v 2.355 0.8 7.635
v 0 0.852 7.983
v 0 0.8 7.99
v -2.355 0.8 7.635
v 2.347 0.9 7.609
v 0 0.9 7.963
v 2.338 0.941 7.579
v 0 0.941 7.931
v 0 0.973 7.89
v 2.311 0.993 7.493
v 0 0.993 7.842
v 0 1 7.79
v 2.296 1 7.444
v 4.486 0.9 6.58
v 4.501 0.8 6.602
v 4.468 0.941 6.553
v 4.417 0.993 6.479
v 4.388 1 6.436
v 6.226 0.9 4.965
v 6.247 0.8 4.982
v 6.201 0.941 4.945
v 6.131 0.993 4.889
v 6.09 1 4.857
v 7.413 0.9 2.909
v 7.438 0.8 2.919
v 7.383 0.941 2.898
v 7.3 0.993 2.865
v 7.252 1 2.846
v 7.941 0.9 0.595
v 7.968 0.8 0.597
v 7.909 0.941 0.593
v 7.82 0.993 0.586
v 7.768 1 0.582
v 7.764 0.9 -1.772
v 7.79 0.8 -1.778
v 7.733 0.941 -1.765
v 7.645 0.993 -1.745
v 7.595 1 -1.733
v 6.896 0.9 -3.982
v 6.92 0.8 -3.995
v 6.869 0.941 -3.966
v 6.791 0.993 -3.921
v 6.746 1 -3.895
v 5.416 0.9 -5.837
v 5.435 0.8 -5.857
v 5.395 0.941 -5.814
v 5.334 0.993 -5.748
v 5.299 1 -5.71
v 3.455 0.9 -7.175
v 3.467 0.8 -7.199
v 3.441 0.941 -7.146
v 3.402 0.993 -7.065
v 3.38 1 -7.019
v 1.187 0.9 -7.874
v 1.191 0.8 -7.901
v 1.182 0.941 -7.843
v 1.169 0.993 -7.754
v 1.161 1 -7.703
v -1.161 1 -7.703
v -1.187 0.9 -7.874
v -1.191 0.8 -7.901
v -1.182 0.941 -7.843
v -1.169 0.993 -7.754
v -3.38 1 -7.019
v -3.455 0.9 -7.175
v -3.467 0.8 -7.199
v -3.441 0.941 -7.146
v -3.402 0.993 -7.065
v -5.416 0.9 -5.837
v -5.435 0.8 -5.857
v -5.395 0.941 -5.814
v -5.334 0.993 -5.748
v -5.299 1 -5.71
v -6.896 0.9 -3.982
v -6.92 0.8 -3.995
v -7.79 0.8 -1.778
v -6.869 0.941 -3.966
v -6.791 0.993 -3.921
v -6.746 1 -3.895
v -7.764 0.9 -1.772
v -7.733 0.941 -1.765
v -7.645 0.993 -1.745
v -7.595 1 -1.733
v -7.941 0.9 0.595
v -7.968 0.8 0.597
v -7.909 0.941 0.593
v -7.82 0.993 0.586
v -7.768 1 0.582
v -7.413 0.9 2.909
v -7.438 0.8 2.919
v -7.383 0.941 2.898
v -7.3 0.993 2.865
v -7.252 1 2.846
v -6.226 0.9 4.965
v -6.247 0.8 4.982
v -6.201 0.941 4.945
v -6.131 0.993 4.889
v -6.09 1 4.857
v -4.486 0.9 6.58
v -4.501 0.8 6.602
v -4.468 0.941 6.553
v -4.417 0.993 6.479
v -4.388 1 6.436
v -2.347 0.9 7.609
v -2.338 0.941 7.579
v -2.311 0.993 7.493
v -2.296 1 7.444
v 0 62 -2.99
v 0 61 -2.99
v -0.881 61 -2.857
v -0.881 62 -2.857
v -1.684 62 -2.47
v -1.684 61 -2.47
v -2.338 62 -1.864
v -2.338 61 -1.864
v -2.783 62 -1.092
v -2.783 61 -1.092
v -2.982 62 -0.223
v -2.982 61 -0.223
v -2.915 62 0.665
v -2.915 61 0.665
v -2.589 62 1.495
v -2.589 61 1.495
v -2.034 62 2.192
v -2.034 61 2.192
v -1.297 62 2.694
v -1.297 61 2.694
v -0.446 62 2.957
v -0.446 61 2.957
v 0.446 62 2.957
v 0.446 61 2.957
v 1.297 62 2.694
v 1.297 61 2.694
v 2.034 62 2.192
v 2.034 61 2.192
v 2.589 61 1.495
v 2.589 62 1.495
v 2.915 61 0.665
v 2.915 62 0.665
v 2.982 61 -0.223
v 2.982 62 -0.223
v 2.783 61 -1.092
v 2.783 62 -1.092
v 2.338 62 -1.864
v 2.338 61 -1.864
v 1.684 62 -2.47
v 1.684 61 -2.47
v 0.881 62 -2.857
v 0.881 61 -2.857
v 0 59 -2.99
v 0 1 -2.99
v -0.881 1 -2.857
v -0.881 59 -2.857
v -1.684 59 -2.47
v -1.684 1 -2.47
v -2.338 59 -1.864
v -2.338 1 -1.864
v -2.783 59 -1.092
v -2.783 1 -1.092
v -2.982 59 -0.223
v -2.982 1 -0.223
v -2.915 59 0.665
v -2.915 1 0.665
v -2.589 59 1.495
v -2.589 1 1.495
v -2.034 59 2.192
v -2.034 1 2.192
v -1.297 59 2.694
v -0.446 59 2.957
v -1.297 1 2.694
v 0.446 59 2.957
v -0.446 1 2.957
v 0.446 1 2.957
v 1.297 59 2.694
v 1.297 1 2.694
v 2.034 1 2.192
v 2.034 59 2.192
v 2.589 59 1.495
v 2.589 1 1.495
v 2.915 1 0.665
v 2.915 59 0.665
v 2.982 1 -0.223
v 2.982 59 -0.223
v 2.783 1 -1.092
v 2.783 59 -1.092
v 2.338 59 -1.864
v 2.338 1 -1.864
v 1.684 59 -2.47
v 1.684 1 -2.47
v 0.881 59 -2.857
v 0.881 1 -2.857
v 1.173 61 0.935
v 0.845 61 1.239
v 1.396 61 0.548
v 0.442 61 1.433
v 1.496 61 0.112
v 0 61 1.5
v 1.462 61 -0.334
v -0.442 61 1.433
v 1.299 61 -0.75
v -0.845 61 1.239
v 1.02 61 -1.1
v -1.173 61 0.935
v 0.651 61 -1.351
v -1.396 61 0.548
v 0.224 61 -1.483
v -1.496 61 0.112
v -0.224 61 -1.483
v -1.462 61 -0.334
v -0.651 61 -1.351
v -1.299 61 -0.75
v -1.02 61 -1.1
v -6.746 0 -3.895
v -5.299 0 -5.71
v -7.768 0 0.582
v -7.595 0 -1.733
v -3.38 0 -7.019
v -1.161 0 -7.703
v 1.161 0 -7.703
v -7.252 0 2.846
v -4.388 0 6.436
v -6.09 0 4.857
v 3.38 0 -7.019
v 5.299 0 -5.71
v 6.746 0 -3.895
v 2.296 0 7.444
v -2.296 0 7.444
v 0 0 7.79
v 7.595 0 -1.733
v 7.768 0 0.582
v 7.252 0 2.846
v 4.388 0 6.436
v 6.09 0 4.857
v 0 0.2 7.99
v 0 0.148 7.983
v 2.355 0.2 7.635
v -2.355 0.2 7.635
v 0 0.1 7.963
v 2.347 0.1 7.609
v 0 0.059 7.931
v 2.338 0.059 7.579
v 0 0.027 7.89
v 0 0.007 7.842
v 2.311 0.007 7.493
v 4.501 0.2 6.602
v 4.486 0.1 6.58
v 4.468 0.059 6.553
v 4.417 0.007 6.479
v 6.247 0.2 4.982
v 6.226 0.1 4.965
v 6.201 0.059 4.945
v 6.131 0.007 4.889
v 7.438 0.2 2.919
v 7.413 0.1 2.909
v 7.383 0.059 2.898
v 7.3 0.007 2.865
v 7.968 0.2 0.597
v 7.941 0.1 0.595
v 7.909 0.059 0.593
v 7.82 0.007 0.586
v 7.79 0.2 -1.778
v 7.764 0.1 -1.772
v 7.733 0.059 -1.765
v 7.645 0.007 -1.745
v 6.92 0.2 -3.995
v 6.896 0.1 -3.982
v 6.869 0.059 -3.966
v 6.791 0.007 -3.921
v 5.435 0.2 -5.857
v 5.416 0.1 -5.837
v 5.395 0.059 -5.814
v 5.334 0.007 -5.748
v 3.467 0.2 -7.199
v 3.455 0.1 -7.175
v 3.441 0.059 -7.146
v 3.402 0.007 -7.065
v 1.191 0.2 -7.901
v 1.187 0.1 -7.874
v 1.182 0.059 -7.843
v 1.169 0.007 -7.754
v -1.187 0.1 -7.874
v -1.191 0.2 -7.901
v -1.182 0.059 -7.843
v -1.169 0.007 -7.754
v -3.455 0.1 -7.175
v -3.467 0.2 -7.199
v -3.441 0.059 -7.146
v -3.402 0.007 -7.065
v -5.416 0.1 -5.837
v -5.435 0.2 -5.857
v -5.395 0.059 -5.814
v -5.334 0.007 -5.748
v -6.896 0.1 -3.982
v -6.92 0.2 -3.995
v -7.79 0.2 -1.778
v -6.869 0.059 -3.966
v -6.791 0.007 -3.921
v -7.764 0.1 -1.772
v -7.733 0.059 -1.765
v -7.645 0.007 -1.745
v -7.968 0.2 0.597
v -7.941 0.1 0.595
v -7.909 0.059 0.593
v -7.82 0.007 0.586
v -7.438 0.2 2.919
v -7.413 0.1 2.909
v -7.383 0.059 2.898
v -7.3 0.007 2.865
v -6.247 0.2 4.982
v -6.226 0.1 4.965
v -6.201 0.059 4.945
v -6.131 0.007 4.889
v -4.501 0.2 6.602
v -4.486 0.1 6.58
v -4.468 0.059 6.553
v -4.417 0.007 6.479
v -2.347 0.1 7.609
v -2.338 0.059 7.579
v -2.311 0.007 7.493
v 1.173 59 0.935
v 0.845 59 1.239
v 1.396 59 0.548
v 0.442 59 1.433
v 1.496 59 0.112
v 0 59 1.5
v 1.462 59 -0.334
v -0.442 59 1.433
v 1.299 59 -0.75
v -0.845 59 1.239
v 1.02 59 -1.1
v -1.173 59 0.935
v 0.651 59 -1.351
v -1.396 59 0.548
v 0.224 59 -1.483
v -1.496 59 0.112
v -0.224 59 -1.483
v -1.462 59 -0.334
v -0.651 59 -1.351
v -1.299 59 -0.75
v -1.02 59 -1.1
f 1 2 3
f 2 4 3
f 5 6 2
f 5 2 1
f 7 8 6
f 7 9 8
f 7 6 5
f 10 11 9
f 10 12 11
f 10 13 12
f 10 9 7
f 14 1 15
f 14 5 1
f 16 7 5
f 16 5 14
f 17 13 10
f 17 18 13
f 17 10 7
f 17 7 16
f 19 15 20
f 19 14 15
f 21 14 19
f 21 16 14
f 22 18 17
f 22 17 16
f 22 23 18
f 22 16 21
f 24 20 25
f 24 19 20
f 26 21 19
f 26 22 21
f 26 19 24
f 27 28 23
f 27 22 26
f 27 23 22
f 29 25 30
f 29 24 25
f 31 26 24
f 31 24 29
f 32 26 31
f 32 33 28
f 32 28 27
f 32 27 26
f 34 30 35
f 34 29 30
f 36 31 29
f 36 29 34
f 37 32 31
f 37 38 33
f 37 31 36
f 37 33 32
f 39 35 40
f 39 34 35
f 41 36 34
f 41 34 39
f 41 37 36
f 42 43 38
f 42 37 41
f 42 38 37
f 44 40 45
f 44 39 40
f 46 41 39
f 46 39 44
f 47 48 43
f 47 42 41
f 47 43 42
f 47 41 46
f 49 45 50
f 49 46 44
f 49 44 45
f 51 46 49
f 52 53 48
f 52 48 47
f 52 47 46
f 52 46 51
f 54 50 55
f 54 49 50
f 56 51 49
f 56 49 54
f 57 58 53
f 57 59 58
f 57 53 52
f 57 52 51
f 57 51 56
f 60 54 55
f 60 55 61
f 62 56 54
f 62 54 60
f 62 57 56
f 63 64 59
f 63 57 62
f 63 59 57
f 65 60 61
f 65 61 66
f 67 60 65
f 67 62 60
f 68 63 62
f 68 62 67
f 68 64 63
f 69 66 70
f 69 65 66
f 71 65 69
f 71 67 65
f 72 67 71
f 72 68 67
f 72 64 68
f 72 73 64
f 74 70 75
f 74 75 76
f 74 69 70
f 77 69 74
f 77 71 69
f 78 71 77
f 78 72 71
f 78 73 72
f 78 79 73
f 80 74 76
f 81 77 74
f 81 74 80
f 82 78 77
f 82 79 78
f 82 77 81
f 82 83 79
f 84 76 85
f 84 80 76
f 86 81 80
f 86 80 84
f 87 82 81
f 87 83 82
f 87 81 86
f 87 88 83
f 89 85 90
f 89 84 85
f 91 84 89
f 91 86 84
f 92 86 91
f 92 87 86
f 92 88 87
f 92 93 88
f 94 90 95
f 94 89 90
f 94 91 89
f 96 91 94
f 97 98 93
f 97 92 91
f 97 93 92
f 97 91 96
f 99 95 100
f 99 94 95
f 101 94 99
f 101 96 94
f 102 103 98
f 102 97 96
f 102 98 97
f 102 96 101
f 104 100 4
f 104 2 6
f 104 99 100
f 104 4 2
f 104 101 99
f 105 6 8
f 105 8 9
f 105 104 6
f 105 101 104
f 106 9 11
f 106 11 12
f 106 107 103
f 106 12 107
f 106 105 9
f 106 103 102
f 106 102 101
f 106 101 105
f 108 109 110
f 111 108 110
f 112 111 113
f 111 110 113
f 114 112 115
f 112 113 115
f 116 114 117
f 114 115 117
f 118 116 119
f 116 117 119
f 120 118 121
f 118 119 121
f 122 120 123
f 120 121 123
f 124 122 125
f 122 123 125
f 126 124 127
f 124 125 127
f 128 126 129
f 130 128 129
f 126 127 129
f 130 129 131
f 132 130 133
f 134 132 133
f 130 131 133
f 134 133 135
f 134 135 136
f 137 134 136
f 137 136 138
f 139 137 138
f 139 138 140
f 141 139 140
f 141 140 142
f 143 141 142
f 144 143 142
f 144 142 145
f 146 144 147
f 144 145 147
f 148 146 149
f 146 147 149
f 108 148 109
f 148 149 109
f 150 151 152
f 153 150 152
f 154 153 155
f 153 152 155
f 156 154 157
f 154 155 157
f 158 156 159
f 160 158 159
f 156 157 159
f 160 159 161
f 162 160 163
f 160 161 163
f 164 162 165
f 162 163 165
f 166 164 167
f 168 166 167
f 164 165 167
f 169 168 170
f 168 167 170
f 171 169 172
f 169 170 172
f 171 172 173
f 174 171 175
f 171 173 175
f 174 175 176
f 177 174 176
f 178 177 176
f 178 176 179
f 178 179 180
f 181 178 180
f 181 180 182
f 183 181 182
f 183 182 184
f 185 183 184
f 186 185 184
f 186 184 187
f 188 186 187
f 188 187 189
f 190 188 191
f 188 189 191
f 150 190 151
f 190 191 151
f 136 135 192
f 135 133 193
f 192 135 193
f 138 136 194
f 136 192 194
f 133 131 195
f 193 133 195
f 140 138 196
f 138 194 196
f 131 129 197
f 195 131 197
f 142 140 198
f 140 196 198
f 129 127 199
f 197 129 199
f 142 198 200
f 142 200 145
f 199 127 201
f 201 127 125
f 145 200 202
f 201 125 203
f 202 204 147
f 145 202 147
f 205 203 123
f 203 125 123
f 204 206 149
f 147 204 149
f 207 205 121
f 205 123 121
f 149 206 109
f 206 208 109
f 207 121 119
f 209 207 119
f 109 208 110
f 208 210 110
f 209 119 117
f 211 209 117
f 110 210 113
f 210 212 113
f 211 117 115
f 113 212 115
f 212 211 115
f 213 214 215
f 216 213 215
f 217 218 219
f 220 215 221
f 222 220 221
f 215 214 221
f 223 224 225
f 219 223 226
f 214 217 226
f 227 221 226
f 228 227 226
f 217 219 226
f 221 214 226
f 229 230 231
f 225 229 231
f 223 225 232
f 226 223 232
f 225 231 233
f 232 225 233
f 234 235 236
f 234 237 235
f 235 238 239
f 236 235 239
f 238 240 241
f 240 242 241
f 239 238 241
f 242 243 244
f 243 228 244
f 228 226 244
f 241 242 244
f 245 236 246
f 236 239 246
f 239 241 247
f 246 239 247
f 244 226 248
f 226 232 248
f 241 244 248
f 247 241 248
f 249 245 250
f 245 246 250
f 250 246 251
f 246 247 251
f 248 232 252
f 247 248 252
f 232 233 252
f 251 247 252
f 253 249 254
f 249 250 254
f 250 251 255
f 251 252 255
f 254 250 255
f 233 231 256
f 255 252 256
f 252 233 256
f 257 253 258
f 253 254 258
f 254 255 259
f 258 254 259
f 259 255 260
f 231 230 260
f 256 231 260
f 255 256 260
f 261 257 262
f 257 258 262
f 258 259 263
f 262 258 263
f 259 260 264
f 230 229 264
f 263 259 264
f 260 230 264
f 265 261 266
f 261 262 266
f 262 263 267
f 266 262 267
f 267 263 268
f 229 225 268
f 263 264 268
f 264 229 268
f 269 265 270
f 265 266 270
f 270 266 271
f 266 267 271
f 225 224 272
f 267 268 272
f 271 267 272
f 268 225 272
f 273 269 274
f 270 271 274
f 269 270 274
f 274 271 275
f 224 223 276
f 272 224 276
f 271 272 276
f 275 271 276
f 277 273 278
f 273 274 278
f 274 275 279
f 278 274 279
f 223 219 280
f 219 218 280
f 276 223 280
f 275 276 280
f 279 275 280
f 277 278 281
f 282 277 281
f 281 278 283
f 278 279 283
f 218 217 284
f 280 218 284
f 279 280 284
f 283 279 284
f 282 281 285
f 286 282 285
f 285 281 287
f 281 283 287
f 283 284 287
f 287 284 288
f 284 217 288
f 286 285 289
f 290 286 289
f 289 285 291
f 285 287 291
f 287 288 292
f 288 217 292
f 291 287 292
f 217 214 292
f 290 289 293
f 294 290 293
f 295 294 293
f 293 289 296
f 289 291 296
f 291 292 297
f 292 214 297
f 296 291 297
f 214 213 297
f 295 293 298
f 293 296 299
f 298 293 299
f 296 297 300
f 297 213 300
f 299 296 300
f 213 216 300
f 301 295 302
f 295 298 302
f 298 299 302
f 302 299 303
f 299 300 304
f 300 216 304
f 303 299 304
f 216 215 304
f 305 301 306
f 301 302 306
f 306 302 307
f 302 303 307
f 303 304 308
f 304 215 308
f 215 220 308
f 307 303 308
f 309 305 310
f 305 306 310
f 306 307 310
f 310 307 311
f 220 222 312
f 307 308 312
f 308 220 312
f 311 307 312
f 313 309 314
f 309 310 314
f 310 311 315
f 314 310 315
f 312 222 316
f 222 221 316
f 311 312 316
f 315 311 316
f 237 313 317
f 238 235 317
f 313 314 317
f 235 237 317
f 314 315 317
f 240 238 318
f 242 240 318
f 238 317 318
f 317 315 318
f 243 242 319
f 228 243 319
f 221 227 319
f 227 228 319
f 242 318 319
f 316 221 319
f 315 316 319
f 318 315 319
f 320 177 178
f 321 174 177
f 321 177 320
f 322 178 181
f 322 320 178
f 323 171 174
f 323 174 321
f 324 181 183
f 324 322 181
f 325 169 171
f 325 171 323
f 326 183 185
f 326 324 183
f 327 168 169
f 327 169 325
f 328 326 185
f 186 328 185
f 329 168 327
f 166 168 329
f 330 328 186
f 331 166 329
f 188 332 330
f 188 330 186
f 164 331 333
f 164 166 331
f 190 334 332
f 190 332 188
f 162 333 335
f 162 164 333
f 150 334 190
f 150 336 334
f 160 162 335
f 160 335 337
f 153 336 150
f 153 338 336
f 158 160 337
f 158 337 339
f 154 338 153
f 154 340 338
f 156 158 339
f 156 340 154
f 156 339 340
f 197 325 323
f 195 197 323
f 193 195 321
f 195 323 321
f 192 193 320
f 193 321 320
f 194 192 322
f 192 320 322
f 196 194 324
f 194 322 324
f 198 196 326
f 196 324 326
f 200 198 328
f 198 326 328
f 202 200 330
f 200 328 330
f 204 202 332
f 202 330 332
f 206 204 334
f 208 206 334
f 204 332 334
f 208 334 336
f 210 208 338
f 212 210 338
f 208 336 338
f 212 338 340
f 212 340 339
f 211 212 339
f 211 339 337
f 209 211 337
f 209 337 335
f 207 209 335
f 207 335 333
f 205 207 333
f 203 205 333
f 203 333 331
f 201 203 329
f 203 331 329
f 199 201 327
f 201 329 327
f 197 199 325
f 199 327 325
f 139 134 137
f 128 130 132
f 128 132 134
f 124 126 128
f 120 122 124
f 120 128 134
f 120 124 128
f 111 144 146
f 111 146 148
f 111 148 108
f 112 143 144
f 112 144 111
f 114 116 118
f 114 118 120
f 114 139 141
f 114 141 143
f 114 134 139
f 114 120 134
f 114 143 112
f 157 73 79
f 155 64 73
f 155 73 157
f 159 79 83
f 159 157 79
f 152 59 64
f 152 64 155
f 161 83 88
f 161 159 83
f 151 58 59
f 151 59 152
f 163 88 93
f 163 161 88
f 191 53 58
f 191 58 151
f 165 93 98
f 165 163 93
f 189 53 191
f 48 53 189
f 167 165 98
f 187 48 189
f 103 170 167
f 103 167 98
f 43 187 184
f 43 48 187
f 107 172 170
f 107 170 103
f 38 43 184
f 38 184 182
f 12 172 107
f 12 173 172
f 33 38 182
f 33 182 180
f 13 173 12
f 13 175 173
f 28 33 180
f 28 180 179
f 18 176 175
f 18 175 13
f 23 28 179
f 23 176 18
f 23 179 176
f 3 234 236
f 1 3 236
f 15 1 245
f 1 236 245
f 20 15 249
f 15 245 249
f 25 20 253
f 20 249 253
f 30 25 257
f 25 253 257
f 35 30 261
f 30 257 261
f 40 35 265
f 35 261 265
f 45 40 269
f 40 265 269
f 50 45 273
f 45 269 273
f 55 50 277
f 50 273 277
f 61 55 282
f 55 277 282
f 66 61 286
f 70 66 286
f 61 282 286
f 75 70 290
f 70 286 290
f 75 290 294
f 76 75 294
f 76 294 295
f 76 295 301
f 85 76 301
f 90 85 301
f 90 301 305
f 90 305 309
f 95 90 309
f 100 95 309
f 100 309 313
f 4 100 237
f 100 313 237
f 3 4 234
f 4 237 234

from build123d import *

# Parameters (mm, degrees)
SKETCH1_R           = 7.99
BOSS_EXTRUDE1_DEPTH = 1
FILLET1_R           = 0.2
SKETCH2_R           = 2.99
BOSS_EXTRUDE3_DEPTH = 58
SKETCH4_R           = 1.5
BOSS_EXTRUDE4_DEPTH = 2
SKETCH5_R           = 2.99
BOSS_EXTRUDE5_DEPTH = 1


with BuildPart() as part:
    # Sketch1 → Boss-Extrude1 (new body)
    with BuildSketch(Plane(origin=(0, 0, 0), x_dir=(1, 0, 0), z_dir=(0, 1, 0))):
        Circle(SKETCH1_R)
    extrude(amount=BOSS_EXTRUDE1_DEPTH)

    # Fillet1
    fillet1_edges = [part.edges().sort_by_distance(p)[0] for p in [
        (-7.99, 0, 0),
        (-7.99, 1, 0),
    ]]
    fillet(fillet1_edges, radius=FILLET1_R)

    # Sketch2 → Boss-Extrude3 (add)
    with BuildSketch(Plane(origin=(0, 1, 0), x_dir=(1, 0, 0), z_dir=(0, 1, 0))):
        Circle(SKETCH2_R)
    extrude(amount=BOSS_EXTRUDE3_DEPTH)

    # Sketch4 → Boss-Extrude4 (add)
    with BuildSketch(Plane(origin=(0, 59, 0), x_dir=(1, 0, 0), z_dir=(0, 1, 0))):
        Circle(SKETCH4_R)
    extrude(amount=BOSS_EXTRUDE4_DEPTH)

    # Sketch5 → Boss-Extrude5 (add)
    with BuildSketch(Plane(origin=(0, 61, 0), x_dir=(1, 0, 0), z_dir=(0, 1, 0))):
        Circle(SKETCH5_R)
    extrude(amount=BOSS_EXTRUDE5_DEPTH)


solid = part.part
